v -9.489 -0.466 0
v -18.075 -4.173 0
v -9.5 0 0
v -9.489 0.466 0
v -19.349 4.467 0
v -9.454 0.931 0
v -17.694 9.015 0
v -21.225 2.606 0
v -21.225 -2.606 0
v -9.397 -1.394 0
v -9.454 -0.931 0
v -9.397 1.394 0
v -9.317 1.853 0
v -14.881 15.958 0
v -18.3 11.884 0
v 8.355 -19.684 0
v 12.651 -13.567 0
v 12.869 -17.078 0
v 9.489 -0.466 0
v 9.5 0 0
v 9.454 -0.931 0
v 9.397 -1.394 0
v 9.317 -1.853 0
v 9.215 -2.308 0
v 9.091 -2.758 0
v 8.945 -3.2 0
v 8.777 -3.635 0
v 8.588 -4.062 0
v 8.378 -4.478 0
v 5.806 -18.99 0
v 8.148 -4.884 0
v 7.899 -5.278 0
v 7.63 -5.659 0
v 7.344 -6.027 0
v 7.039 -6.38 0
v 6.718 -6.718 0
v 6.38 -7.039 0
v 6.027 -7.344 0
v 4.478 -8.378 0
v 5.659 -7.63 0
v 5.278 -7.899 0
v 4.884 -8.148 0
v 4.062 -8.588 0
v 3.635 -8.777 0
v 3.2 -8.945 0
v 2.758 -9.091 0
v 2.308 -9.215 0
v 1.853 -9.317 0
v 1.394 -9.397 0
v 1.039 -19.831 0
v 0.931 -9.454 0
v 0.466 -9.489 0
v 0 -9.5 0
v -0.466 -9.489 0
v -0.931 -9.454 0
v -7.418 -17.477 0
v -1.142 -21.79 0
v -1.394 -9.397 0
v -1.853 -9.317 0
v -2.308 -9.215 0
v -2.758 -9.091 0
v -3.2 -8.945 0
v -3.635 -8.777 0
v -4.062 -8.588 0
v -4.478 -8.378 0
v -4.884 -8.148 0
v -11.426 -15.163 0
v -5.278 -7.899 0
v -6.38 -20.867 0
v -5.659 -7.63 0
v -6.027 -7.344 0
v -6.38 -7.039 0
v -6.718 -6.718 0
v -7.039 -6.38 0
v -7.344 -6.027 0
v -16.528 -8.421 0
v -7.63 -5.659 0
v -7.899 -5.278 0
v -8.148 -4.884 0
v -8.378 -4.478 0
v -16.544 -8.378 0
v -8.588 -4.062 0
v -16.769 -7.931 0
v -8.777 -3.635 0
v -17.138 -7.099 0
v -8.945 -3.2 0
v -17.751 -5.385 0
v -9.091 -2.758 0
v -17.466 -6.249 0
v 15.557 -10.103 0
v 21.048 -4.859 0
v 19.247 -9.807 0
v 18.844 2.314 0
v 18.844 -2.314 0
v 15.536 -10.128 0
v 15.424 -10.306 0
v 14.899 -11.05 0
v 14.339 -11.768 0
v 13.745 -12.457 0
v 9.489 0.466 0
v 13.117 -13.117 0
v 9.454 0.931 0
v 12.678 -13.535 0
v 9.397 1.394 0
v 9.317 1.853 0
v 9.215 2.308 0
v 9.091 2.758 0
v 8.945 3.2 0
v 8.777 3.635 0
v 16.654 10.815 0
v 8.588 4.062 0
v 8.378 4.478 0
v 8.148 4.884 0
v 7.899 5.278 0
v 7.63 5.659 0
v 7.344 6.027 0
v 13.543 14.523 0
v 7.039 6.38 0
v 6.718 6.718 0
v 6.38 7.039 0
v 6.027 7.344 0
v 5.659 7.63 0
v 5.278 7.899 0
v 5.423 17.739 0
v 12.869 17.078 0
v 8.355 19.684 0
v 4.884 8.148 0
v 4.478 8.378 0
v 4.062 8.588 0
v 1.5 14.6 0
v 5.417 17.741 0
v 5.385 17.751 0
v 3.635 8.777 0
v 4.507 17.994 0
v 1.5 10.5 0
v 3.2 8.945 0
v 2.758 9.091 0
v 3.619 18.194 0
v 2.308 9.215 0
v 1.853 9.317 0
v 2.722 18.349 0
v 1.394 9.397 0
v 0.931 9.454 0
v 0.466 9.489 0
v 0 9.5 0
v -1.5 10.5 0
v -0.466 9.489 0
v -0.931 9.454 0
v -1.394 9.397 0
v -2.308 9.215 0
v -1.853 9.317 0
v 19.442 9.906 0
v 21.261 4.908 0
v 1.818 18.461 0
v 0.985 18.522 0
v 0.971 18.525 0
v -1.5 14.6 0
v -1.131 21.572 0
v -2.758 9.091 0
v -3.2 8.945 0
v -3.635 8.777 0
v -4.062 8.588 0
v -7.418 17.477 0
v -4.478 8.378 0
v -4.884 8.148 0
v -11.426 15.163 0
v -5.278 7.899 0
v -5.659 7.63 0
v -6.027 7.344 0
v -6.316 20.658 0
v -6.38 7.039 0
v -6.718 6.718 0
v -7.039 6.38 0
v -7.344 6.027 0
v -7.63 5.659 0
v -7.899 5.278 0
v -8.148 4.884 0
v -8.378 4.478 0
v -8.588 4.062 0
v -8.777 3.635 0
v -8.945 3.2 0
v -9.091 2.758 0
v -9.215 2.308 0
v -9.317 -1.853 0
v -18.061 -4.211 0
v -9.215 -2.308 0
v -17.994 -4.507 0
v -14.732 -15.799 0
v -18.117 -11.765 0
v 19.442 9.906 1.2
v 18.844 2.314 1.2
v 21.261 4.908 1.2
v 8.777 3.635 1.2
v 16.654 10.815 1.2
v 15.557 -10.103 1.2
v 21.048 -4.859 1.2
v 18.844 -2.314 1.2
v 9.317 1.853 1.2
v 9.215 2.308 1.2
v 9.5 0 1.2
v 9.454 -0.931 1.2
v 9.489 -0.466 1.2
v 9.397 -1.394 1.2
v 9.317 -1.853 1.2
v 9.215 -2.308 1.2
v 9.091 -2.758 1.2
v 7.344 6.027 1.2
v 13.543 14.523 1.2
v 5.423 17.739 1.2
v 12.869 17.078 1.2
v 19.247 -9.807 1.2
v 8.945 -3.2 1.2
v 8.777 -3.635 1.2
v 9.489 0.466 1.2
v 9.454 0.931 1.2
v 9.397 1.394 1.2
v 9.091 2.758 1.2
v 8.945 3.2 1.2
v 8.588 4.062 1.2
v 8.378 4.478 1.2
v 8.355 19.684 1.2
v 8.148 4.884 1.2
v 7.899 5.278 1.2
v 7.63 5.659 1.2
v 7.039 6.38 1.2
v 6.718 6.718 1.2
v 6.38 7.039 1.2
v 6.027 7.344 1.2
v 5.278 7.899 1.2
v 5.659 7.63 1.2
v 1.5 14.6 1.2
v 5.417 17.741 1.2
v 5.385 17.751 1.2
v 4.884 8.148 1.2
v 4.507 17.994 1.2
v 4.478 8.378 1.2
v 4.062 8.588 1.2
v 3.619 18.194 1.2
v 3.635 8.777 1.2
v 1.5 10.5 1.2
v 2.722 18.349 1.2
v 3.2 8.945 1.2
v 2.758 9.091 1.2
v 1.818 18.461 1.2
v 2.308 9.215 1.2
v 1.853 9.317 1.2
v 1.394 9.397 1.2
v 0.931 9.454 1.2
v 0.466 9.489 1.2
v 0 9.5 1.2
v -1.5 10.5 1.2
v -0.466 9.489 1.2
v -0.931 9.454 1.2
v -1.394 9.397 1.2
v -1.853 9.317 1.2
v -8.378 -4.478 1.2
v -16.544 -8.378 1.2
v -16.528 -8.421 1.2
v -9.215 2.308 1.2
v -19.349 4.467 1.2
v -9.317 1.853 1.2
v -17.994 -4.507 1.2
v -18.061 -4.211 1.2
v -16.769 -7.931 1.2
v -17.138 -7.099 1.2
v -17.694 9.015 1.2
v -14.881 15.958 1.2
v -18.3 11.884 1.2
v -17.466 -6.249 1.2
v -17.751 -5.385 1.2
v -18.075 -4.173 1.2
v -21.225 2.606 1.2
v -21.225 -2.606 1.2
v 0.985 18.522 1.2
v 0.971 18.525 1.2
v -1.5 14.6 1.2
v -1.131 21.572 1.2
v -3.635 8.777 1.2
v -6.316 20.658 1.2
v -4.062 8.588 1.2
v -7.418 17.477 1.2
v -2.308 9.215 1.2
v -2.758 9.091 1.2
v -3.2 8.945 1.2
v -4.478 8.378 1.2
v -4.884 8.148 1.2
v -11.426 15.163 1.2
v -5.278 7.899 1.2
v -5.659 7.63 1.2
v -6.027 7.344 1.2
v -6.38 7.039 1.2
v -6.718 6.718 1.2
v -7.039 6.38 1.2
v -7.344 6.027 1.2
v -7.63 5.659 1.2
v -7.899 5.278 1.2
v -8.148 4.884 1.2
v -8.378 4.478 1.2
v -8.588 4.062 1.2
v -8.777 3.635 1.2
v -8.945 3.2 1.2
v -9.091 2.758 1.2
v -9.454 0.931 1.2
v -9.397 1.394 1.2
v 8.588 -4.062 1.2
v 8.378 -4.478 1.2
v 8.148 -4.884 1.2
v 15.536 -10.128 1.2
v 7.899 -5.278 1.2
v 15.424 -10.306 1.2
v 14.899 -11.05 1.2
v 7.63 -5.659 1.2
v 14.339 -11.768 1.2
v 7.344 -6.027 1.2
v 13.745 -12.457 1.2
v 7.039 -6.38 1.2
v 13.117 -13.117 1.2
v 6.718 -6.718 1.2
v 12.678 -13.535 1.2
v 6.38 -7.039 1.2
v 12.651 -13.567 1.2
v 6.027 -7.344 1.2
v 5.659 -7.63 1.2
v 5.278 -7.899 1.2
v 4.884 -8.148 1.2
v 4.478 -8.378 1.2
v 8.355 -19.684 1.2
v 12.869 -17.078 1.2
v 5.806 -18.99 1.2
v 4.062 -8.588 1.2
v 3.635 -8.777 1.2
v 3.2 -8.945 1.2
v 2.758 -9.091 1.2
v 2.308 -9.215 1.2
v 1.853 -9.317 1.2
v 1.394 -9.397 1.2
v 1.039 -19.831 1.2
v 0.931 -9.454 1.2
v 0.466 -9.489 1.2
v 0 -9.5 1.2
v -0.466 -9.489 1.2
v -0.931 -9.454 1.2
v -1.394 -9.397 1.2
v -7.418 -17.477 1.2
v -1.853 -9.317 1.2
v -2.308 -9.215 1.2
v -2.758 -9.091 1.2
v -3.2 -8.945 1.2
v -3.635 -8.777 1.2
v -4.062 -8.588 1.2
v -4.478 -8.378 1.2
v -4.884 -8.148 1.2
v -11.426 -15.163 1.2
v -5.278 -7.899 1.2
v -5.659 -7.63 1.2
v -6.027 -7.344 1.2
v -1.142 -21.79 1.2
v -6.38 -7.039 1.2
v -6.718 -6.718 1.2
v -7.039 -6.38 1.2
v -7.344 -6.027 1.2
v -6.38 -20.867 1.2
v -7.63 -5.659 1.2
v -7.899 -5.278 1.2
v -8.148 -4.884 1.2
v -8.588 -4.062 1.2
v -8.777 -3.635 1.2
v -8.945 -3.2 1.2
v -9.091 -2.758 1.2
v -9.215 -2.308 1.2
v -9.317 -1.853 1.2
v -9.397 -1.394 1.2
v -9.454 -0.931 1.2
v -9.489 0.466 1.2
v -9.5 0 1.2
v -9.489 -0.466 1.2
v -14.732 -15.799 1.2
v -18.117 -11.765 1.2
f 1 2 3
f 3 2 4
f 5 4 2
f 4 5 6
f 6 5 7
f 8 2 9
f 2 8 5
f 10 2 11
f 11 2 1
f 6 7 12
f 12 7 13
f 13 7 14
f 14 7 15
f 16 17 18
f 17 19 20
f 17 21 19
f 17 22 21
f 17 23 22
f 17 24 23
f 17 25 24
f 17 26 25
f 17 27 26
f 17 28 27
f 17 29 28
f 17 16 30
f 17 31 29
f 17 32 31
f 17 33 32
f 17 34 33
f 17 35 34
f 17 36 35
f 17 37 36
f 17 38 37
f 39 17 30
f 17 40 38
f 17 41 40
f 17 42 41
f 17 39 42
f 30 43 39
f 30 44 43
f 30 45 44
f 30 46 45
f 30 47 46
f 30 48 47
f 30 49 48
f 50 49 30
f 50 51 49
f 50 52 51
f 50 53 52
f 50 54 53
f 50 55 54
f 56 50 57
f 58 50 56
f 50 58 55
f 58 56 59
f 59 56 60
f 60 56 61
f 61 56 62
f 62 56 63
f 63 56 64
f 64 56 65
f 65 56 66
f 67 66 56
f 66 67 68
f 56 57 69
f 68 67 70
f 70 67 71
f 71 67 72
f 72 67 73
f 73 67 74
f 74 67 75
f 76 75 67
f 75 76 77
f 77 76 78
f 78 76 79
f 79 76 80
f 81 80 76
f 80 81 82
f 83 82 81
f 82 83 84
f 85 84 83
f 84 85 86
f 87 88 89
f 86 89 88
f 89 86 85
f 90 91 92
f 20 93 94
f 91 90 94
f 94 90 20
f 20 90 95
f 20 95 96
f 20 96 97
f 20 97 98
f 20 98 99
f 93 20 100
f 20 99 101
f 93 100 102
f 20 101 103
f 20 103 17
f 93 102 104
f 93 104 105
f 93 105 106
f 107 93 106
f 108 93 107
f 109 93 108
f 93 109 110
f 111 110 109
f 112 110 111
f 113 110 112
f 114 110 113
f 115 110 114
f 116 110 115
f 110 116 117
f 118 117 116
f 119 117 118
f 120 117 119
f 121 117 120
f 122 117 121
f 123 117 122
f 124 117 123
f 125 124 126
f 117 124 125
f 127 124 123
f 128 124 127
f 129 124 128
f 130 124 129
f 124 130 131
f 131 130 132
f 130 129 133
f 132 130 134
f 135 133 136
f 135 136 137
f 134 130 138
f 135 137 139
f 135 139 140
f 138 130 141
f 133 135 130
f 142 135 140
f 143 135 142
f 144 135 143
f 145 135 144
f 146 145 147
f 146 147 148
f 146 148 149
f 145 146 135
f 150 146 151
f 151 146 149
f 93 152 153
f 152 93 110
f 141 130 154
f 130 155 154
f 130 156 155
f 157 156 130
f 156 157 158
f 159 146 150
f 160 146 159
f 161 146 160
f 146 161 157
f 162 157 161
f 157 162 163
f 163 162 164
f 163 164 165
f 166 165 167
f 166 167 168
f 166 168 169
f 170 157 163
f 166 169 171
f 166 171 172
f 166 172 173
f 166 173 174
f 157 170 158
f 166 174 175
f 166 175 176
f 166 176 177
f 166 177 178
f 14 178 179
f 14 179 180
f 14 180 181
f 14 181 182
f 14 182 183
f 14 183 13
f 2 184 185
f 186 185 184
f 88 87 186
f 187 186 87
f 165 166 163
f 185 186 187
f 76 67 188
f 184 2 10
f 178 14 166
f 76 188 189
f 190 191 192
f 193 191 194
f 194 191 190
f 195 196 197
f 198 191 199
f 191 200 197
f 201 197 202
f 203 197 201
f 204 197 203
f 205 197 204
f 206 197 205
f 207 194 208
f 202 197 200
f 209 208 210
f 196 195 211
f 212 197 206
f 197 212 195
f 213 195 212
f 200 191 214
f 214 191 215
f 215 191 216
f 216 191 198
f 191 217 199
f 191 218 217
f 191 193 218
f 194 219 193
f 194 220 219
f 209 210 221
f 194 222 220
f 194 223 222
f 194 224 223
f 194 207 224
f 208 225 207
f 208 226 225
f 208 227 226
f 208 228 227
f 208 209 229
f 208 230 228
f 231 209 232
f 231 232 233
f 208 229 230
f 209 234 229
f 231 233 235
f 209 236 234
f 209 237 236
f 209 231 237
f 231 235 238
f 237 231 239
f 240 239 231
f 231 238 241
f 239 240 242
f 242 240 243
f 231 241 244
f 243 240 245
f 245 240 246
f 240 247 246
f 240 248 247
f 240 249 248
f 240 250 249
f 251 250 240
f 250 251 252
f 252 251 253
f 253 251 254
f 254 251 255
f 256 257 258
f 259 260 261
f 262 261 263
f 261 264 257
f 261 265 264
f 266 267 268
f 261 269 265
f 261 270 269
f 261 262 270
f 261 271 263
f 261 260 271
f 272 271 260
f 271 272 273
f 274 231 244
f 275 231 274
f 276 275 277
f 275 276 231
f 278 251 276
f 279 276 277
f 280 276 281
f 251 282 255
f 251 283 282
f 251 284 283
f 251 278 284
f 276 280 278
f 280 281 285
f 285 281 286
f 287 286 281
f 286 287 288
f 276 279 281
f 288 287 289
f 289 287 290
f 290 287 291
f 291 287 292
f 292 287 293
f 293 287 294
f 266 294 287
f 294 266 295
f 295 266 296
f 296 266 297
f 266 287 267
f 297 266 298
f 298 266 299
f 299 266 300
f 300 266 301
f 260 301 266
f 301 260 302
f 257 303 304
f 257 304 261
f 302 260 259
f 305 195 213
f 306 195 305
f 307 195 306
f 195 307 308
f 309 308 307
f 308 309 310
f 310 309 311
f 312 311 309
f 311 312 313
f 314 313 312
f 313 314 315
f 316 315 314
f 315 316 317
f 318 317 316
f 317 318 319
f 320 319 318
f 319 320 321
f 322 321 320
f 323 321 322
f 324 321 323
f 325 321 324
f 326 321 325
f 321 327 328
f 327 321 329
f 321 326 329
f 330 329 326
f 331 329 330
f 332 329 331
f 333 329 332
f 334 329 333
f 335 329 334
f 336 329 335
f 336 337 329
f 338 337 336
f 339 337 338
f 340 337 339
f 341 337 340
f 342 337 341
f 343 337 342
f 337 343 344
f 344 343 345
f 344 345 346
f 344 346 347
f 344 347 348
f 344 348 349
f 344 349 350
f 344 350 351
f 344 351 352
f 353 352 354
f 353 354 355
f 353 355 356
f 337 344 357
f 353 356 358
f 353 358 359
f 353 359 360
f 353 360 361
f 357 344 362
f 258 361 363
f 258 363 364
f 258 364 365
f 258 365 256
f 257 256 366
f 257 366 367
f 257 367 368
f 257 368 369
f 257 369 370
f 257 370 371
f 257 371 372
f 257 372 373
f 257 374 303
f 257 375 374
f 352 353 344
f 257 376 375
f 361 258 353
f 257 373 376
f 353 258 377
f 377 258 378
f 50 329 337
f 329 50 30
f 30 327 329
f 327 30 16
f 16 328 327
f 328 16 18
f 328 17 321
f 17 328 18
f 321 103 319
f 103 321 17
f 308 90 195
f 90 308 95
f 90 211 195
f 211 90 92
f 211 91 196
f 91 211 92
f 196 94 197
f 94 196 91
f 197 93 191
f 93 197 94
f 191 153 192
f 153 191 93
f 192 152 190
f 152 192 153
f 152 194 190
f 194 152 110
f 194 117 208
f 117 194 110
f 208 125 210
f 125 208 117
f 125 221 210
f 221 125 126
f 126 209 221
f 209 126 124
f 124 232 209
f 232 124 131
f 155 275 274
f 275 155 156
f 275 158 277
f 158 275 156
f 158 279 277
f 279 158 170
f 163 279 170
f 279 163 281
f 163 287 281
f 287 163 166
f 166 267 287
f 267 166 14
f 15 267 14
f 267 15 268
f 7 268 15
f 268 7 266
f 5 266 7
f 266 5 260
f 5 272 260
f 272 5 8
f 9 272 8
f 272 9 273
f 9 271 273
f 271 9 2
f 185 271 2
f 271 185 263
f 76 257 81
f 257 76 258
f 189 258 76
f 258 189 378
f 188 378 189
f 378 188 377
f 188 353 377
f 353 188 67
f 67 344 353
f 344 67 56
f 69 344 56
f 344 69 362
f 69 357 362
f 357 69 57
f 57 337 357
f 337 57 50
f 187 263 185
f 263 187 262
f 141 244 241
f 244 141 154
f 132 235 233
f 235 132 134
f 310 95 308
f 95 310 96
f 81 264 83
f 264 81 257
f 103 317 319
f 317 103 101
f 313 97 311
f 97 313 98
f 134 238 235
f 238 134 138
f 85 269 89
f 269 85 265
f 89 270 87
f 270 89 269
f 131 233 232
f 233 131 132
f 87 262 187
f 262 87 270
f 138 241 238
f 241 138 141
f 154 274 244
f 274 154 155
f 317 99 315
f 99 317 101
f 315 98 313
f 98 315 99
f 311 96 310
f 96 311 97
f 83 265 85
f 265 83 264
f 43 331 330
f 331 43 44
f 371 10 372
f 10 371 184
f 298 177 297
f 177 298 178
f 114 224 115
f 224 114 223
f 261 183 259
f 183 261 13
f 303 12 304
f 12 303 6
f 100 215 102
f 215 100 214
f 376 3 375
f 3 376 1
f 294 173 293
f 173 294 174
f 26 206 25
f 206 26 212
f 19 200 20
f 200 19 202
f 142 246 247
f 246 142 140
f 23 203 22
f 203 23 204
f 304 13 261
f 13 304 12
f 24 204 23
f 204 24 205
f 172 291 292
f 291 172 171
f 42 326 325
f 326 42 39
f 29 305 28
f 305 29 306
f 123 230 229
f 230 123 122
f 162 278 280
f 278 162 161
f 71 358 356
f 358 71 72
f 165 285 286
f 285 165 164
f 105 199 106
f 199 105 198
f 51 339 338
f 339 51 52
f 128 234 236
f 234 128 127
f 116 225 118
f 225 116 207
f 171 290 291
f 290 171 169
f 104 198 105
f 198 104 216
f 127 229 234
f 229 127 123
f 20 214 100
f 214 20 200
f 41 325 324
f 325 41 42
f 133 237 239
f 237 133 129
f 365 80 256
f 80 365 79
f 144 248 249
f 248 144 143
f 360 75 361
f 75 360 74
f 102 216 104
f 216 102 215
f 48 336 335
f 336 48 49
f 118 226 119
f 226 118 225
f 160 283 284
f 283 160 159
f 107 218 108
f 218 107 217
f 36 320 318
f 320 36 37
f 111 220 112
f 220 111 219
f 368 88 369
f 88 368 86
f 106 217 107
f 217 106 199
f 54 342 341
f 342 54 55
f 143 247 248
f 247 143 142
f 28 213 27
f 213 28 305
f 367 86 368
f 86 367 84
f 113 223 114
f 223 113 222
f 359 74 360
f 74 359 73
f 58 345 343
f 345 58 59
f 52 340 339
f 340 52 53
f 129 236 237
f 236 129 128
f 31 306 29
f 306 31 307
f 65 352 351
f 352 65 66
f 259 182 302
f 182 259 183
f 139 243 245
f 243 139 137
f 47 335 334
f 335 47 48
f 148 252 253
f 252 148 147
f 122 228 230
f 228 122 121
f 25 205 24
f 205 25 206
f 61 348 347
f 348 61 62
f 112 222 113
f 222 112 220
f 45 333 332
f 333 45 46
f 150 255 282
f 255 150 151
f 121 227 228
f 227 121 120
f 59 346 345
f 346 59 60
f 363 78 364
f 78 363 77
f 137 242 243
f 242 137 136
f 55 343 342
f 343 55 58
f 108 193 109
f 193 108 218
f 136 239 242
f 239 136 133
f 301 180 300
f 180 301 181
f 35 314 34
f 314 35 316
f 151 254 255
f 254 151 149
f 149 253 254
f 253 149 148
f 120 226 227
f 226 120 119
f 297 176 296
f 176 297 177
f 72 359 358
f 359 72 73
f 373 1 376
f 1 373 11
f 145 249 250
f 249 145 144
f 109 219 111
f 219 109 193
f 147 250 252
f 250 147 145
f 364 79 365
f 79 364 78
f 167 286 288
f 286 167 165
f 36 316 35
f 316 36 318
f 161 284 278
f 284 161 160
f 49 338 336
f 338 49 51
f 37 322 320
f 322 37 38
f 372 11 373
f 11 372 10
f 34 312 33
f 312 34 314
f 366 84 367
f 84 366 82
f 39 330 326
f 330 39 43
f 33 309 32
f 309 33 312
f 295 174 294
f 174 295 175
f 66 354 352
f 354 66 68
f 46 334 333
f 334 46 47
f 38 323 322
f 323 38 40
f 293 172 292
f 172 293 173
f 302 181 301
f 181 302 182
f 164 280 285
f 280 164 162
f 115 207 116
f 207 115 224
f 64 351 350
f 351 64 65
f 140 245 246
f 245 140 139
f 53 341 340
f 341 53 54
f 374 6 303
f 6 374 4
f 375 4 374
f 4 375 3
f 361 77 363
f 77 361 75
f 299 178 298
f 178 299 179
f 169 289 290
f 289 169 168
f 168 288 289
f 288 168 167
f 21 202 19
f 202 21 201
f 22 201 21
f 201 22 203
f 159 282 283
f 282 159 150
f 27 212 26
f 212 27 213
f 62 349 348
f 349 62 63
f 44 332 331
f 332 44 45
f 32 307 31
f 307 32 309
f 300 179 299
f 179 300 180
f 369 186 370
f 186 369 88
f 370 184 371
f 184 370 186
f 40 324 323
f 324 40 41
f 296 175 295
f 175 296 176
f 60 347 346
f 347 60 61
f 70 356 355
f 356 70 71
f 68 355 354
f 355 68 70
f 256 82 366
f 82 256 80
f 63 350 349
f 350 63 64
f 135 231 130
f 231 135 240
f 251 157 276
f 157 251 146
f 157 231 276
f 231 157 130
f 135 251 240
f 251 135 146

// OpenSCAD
/*
  Elna Supermatic cam 07
  Name: Decorative zigzag
  Status: candidate

  Generated from measured parametric base v2.
  Surface mode: stepped
*/

include <_elna_measured_common.scad>;

profile_points = [
        [0.9708, 18.5246],
        [5.4235, 17.7395],
        [8.3554, 19.6841],
        [12.8692, 17.0780],
        [13.5431, 14.5232],
        [16.6543, 10.8154],
        [19.4418, 9.9061],
        [21.2608, 4.9084],
        [18.8445, 2.3138],
        [18.8445, -2.3138],
        [21.0483, -4.8594],
        [19.2475, -9.8071],
        [15.5573, -10.1031],
        [12.6511, -13.5666],
        [12.8692, -17.0780],
        [8.3554, -19.6841],
        [5.8059, -18.9903],
        [1.0393, -19.8308],
        [-1.1420, -21.7901],
        [-6.3796, -20.8666],
        [-7.4184, -17.4767],
        [-11.4261, -15.1629],
        [-14.7325, -15.7987],
        [-18.1170, -11.7653],
        [-16.5282, -8.4215],
        [-18.0746, -4.1728],
        [-21.2246, -2.6061],
        [-21.2246, 2.6061],
        [-19.3490, 4.4671],
        [-17.6936, 9.0153],
        [-18.2998, 11.8840],
        [-14.8812, 15.9581],
        [-11.4261, 15.1629],
        [-7.4184, 17.4767],
        [-6.3158, 20.6581],
        [-1.1306, 21.5724]
];

icon_points = [[-1.000,0.180], [-0.750,0.820], [-0.500,0.180], [-0.250,0.820], [0.000,0.180], [0.250,0.820], [0.500,0.180], [0.750,0.820], [1.000,0.180]];

elna_cam_ring(profile_points=profile_points);
